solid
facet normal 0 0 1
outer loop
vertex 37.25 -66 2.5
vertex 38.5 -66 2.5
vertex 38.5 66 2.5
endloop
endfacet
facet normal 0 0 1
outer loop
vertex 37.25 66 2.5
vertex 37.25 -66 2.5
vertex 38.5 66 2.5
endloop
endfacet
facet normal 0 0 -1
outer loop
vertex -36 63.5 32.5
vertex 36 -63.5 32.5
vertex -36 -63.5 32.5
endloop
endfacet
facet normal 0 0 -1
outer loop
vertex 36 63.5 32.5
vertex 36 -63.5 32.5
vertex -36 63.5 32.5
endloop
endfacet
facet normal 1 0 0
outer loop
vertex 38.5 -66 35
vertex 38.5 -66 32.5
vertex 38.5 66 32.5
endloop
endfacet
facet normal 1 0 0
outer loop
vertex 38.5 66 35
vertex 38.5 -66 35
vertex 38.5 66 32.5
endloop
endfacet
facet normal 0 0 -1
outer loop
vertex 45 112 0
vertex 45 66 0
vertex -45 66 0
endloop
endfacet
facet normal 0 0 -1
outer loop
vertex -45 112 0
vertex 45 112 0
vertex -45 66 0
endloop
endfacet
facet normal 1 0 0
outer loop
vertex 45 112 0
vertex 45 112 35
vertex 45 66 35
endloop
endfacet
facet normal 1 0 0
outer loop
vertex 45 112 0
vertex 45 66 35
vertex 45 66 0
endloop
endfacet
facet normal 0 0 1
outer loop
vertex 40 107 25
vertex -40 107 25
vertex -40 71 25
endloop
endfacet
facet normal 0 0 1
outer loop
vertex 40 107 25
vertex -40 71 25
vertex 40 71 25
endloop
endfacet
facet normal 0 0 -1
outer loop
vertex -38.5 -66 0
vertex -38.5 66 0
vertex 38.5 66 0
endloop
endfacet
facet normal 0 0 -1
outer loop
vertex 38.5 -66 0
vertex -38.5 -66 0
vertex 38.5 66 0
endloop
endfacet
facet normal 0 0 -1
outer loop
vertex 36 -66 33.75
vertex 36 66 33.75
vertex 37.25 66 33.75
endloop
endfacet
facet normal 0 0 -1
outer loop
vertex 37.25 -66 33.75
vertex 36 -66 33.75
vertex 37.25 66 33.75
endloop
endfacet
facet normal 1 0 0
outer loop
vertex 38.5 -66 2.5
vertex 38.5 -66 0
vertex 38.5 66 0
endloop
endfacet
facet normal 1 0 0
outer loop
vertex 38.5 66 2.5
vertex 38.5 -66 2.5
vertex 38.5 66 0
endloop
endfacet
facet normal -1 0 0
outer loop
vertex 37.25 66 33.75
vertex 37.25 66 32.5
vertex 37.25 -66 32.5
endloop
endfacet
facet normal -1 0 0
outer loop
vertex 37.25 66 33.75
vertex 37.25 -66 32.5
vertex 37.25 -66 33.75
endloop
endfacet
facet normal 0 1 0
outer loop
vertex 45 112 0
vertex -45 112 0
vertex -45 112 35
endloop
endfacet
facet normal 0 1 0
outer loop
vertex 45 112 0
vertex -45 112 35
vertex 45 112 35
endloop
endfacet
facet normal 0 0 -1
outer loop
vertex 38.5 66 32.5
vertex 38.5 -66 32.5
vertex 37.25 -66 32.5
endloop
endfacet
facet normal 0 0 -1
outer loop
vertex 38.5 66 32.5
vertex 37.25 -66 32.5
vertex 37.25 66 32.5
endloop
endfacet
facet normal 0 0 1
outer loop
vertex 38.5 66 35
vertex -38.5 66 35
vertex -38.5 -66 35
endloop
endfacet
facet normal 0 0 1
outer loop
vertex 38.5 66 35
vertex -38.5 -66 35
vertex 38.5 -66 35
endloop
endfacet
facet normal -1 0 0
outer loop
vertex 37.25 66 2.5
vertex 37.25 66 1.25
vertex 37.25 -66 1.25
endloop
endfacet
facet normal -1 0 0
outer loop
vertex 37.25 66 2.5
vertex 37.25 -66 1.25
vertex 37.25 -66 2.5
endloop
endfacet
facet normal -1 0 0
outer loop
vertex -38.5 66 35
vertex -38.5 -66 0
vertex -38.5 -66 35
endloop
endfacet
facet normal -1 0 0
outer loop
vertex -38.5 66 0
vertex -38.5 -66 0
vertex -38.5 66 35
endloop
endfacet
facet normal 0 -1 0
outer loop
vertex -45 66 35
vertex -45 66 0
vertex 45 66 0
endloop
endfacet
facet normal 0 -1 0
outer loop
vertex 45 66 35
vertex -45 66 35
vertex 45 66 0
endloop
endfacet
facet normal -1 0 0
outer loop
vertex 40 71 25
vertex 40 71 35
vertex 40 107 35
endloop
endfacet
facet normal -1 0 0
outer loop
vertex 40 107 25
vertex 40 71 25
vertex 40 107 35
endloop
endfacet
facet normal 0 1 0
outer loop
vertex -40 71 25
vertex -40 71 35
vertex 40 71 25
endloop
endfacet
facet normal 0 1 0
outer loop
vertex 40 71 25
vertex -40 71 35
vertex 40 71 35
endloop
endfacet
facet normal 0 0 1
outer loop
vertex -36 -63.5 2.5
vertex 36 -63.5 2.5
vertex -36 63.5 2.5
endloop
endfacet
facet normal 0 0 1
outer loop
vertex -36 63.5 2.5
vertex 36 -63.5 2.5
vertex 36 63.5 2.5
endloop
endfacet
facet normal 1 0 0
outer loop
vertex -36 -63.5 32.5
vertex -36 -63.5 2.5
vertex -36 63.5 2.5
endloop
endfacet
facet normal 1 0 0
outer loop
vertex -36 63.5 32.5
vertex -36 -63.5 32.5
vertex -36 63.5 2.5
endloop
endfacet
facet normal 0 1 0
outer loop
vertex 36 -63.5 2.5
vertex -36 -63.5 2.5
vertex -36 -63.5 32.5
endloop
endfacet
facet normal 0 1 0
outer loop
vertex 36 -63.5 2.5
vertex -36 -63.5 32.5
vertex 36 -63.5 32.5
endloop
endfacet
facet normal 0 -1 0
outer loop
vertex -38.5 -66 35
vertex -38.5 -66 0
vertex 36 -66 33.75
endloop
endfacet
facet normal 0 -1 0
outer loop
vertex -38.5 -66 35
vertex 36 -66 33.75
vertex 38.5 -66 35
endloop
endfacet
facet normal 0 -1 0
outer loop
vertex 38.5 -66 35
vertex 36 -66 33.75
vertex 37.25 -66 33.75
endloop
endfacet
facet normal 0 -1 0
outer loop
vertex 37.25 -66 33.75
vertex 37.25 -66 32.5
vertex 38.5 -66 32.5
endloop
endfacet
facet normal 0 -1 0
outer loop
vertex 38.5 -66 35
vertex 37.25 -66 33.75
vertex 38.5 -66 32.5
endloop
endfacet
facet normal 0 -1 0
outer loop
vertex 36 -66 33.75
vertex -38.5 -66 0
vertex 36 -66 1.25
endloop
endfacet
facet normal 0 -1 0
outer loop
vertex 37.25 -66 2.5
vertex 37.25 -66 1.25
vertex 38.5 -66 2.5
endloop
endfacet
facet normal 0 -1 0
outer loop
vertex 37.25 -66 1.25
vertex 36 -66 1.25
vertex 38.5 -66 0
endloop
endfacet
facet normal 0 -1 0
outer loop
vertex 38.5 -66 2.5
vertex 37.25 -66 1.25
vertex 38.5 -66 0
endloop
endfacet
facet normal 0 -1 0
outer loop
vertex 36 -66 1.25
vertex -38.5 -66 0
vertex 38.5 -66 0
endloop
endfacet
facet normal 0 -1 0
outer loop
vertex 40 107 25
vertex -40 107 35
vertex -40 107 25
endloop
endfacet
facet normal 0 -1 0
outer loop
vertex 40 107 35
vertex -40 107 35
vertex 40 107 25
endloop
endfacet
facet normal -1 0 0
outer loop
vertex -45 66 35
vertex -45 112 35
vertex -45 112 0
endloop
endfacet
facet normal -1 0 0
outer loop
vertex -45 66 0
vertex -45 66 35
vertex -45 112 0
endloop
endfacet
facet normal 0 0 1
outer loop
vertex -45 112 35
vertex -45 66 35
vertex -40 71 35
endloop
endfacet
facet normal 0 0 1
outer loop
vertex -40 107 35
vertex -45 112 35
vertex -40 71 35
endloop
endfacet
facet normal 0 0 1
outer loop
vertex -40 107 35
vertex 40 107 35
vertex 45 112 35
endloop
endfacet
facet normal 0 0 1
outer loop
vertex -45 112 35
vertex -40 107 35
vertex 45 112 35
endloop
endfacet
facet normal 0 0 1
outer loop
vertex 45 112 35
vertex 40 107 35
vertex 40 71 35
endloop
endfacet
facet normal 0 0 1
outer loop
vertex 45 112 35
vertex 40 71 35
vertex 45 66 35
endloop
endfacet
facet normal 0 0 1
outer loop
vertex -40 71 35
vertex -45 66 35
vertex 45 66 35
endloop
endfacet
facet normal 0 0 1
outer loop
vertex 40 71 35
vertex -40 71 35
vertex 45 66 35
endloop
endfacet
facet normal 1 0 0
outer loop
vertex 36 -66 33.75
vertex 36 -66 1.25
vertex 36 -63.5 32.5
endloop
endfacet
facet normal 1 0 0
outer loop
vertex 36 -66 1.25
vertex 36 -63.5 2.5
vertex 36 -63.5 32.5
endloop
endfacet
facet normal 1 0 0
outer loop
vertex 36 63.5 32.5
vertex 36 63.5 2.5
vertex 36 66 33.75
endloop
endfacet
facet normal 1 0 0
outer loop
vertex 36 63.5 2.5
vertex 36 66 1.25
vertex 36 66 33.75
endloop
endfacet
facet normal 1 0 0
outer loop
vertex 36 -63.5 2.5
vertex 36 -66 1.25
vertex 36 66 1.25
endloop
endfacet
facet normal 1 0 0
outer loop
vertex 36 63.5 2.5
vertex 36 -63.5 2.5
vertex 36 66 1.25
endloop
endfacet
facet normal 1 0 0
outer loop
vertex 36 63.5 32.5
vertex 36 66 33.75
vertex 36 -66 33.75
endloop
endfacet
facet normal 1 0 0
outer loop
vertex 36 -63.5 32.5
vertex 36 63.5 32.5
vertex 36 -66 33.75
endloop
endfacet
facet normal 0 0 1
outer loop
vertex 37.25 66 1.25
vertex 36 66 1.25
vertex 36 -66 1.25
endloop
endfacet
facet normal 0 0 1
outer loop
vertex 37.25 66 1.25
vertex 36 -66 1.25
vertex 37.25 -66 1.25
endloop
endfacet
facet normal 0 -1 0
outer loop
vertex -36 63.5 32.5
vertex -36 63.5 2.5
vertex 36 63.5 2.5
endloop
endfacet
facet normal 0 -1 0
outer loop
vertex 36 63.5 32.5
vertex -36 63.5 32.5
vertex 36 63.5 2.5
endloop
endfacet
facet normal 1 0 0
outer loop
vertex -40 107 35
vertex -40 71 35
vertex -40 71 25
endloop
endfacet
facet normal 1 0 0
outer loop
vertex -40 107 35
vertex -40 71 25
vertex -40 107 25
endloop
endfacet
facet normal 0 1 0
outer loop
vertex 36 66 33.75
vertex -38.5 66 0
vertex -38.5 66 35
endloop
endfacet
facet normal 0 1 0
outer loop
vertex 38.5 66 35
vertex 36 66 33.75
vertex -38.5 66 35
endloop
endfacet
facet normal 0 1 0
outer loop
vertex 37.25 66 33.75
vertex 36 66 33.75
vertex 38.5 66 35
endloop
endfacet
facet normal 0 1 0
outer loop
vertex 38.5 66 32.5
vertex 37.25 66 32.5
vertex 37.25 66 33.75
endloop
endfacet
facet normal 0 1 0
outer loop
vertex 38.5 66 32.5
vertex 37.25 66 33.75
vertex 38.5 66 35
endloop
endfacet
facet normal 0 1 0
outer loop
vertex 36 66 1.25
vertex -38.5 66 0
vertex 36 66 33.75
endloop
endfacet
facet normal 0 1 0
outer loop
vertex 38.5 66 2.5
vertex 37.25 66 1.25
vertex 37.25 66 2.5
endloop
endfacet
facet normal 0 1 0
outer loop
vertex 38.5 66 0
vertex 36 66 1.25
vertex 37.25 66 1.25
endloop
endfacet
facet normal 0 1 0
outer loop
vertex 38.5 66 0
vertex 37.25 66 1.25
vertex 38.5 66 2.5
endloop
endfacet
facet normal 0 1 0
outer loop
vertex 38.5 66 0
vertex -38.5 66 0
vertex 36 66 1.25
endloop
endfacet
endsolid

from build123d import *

# Parameters (mm, degrees)
SKETCH1_W           = 77
SKETCH1_H           = 132
BOSS_EXTRUDE1_DEPTH = 35
SKETCH2_W           = 77
SKETCH2_H           = 35
SKETCH2_W_2         = 6.5
BOSS_EXTRUDE3_DEPTH = 46
SHELL4_T            = -2.5
SKETCH3_W           = 80
SKETCH3_H           = 36
CUT_EXTRUDE1_DEPTH  = 10
SKETCH4_W           = 30
SKETCH4_H           = 132
CUT_EXTRUDE2_DEPTH  = 2.5
CUT_EXTRUDE3_START  = -178
SKETCH5_W           = 1.25
SKETCH5_H           = 1.25
CUT_EXTRUDE3_DEPTH  = 178


with BuildPart() as part:
    # Sketch1 → Boss-Extrude1 (new body)
    with BuildSketch(Plane.XY):
        Rectangle(SKETCH1_W, SKETCH1_H)
    extrude(amount=BOSS_EXTRUDE1_DEPTH)

    # Shell4
    shell4_openings = [part.faces().sort_by_distance(p)[0] for p in [
        (38.5, 0, 17.5),
    ]]
    offset(amount=SHELL4_T, openings=shell4_openings, kind=Kind.INTERSECTION)

    # Sketch4 → Cut-Extrude2 (cut)
    with BuildSketch(Plane(origin=(38.5, 0, 0), x_dir=(0, 0, -1), z_dir=(1, 0, 0))):
        with Locations((-17.5, 0)):
            Rectangle(SKETCH4_W, SKETCH4_H)
    extrude(amount=-CUT_EXTRUDE2_DEPTH, mode=Mode.SUBTRACT)

    # Sketch5 → Cut-Extrude3 (cut)
    with BuildSketch(Plane.XZ.offset(66).offset(CUT_EXTRUDE3_START)):
        with Locations((36.625, 33.125)):
            Rectangle(SKETCH5_W, SKETCH5_H)
        with Locations((36.625, 1.875)):
            Rectangle(SKETCH5_W, SKETCH5_H)
    extrude(amount=CUT_EXTRUDE3_DEPTH, mode=Mode.SUBTRACT)


with BuildPart() as body_2:
    # Sketch2 → Boss-Extrude3 (new body)
    with BuildSketch(Plane(origin=(0, 66, 0), x_dir=(1, 0, 0), z_dir=(0, 1, 0))):
        with Locations((0, -17.5)):
            Rectangle(SKETCH2_W, SKETCH2_H)
        with Locations((-41.75, -17.5)):
            Rectangle(SKETCH2_W_2, SKETCH2_H)
        with Locations((41.75, -17.5)):
            Rectangle(SKETCH2_W_2, SKETCH2_H)
    extrude(amount=BOSS_EXTRUDE3_DEPTH)

    # Sketch3 → Cut-Extrude1 (cut)
    with BuildSketch(Plane.XY.offset(35)):
        with Locations((0, 89)):
            Rectangle(SKETCH3_W, SKETCH3_H)
    extrude(amount=-CUT_EXTRUDE1_DEPTH, mode=Mode.SUBTRACT)


solid = Compound([part.part, body_2.part])
